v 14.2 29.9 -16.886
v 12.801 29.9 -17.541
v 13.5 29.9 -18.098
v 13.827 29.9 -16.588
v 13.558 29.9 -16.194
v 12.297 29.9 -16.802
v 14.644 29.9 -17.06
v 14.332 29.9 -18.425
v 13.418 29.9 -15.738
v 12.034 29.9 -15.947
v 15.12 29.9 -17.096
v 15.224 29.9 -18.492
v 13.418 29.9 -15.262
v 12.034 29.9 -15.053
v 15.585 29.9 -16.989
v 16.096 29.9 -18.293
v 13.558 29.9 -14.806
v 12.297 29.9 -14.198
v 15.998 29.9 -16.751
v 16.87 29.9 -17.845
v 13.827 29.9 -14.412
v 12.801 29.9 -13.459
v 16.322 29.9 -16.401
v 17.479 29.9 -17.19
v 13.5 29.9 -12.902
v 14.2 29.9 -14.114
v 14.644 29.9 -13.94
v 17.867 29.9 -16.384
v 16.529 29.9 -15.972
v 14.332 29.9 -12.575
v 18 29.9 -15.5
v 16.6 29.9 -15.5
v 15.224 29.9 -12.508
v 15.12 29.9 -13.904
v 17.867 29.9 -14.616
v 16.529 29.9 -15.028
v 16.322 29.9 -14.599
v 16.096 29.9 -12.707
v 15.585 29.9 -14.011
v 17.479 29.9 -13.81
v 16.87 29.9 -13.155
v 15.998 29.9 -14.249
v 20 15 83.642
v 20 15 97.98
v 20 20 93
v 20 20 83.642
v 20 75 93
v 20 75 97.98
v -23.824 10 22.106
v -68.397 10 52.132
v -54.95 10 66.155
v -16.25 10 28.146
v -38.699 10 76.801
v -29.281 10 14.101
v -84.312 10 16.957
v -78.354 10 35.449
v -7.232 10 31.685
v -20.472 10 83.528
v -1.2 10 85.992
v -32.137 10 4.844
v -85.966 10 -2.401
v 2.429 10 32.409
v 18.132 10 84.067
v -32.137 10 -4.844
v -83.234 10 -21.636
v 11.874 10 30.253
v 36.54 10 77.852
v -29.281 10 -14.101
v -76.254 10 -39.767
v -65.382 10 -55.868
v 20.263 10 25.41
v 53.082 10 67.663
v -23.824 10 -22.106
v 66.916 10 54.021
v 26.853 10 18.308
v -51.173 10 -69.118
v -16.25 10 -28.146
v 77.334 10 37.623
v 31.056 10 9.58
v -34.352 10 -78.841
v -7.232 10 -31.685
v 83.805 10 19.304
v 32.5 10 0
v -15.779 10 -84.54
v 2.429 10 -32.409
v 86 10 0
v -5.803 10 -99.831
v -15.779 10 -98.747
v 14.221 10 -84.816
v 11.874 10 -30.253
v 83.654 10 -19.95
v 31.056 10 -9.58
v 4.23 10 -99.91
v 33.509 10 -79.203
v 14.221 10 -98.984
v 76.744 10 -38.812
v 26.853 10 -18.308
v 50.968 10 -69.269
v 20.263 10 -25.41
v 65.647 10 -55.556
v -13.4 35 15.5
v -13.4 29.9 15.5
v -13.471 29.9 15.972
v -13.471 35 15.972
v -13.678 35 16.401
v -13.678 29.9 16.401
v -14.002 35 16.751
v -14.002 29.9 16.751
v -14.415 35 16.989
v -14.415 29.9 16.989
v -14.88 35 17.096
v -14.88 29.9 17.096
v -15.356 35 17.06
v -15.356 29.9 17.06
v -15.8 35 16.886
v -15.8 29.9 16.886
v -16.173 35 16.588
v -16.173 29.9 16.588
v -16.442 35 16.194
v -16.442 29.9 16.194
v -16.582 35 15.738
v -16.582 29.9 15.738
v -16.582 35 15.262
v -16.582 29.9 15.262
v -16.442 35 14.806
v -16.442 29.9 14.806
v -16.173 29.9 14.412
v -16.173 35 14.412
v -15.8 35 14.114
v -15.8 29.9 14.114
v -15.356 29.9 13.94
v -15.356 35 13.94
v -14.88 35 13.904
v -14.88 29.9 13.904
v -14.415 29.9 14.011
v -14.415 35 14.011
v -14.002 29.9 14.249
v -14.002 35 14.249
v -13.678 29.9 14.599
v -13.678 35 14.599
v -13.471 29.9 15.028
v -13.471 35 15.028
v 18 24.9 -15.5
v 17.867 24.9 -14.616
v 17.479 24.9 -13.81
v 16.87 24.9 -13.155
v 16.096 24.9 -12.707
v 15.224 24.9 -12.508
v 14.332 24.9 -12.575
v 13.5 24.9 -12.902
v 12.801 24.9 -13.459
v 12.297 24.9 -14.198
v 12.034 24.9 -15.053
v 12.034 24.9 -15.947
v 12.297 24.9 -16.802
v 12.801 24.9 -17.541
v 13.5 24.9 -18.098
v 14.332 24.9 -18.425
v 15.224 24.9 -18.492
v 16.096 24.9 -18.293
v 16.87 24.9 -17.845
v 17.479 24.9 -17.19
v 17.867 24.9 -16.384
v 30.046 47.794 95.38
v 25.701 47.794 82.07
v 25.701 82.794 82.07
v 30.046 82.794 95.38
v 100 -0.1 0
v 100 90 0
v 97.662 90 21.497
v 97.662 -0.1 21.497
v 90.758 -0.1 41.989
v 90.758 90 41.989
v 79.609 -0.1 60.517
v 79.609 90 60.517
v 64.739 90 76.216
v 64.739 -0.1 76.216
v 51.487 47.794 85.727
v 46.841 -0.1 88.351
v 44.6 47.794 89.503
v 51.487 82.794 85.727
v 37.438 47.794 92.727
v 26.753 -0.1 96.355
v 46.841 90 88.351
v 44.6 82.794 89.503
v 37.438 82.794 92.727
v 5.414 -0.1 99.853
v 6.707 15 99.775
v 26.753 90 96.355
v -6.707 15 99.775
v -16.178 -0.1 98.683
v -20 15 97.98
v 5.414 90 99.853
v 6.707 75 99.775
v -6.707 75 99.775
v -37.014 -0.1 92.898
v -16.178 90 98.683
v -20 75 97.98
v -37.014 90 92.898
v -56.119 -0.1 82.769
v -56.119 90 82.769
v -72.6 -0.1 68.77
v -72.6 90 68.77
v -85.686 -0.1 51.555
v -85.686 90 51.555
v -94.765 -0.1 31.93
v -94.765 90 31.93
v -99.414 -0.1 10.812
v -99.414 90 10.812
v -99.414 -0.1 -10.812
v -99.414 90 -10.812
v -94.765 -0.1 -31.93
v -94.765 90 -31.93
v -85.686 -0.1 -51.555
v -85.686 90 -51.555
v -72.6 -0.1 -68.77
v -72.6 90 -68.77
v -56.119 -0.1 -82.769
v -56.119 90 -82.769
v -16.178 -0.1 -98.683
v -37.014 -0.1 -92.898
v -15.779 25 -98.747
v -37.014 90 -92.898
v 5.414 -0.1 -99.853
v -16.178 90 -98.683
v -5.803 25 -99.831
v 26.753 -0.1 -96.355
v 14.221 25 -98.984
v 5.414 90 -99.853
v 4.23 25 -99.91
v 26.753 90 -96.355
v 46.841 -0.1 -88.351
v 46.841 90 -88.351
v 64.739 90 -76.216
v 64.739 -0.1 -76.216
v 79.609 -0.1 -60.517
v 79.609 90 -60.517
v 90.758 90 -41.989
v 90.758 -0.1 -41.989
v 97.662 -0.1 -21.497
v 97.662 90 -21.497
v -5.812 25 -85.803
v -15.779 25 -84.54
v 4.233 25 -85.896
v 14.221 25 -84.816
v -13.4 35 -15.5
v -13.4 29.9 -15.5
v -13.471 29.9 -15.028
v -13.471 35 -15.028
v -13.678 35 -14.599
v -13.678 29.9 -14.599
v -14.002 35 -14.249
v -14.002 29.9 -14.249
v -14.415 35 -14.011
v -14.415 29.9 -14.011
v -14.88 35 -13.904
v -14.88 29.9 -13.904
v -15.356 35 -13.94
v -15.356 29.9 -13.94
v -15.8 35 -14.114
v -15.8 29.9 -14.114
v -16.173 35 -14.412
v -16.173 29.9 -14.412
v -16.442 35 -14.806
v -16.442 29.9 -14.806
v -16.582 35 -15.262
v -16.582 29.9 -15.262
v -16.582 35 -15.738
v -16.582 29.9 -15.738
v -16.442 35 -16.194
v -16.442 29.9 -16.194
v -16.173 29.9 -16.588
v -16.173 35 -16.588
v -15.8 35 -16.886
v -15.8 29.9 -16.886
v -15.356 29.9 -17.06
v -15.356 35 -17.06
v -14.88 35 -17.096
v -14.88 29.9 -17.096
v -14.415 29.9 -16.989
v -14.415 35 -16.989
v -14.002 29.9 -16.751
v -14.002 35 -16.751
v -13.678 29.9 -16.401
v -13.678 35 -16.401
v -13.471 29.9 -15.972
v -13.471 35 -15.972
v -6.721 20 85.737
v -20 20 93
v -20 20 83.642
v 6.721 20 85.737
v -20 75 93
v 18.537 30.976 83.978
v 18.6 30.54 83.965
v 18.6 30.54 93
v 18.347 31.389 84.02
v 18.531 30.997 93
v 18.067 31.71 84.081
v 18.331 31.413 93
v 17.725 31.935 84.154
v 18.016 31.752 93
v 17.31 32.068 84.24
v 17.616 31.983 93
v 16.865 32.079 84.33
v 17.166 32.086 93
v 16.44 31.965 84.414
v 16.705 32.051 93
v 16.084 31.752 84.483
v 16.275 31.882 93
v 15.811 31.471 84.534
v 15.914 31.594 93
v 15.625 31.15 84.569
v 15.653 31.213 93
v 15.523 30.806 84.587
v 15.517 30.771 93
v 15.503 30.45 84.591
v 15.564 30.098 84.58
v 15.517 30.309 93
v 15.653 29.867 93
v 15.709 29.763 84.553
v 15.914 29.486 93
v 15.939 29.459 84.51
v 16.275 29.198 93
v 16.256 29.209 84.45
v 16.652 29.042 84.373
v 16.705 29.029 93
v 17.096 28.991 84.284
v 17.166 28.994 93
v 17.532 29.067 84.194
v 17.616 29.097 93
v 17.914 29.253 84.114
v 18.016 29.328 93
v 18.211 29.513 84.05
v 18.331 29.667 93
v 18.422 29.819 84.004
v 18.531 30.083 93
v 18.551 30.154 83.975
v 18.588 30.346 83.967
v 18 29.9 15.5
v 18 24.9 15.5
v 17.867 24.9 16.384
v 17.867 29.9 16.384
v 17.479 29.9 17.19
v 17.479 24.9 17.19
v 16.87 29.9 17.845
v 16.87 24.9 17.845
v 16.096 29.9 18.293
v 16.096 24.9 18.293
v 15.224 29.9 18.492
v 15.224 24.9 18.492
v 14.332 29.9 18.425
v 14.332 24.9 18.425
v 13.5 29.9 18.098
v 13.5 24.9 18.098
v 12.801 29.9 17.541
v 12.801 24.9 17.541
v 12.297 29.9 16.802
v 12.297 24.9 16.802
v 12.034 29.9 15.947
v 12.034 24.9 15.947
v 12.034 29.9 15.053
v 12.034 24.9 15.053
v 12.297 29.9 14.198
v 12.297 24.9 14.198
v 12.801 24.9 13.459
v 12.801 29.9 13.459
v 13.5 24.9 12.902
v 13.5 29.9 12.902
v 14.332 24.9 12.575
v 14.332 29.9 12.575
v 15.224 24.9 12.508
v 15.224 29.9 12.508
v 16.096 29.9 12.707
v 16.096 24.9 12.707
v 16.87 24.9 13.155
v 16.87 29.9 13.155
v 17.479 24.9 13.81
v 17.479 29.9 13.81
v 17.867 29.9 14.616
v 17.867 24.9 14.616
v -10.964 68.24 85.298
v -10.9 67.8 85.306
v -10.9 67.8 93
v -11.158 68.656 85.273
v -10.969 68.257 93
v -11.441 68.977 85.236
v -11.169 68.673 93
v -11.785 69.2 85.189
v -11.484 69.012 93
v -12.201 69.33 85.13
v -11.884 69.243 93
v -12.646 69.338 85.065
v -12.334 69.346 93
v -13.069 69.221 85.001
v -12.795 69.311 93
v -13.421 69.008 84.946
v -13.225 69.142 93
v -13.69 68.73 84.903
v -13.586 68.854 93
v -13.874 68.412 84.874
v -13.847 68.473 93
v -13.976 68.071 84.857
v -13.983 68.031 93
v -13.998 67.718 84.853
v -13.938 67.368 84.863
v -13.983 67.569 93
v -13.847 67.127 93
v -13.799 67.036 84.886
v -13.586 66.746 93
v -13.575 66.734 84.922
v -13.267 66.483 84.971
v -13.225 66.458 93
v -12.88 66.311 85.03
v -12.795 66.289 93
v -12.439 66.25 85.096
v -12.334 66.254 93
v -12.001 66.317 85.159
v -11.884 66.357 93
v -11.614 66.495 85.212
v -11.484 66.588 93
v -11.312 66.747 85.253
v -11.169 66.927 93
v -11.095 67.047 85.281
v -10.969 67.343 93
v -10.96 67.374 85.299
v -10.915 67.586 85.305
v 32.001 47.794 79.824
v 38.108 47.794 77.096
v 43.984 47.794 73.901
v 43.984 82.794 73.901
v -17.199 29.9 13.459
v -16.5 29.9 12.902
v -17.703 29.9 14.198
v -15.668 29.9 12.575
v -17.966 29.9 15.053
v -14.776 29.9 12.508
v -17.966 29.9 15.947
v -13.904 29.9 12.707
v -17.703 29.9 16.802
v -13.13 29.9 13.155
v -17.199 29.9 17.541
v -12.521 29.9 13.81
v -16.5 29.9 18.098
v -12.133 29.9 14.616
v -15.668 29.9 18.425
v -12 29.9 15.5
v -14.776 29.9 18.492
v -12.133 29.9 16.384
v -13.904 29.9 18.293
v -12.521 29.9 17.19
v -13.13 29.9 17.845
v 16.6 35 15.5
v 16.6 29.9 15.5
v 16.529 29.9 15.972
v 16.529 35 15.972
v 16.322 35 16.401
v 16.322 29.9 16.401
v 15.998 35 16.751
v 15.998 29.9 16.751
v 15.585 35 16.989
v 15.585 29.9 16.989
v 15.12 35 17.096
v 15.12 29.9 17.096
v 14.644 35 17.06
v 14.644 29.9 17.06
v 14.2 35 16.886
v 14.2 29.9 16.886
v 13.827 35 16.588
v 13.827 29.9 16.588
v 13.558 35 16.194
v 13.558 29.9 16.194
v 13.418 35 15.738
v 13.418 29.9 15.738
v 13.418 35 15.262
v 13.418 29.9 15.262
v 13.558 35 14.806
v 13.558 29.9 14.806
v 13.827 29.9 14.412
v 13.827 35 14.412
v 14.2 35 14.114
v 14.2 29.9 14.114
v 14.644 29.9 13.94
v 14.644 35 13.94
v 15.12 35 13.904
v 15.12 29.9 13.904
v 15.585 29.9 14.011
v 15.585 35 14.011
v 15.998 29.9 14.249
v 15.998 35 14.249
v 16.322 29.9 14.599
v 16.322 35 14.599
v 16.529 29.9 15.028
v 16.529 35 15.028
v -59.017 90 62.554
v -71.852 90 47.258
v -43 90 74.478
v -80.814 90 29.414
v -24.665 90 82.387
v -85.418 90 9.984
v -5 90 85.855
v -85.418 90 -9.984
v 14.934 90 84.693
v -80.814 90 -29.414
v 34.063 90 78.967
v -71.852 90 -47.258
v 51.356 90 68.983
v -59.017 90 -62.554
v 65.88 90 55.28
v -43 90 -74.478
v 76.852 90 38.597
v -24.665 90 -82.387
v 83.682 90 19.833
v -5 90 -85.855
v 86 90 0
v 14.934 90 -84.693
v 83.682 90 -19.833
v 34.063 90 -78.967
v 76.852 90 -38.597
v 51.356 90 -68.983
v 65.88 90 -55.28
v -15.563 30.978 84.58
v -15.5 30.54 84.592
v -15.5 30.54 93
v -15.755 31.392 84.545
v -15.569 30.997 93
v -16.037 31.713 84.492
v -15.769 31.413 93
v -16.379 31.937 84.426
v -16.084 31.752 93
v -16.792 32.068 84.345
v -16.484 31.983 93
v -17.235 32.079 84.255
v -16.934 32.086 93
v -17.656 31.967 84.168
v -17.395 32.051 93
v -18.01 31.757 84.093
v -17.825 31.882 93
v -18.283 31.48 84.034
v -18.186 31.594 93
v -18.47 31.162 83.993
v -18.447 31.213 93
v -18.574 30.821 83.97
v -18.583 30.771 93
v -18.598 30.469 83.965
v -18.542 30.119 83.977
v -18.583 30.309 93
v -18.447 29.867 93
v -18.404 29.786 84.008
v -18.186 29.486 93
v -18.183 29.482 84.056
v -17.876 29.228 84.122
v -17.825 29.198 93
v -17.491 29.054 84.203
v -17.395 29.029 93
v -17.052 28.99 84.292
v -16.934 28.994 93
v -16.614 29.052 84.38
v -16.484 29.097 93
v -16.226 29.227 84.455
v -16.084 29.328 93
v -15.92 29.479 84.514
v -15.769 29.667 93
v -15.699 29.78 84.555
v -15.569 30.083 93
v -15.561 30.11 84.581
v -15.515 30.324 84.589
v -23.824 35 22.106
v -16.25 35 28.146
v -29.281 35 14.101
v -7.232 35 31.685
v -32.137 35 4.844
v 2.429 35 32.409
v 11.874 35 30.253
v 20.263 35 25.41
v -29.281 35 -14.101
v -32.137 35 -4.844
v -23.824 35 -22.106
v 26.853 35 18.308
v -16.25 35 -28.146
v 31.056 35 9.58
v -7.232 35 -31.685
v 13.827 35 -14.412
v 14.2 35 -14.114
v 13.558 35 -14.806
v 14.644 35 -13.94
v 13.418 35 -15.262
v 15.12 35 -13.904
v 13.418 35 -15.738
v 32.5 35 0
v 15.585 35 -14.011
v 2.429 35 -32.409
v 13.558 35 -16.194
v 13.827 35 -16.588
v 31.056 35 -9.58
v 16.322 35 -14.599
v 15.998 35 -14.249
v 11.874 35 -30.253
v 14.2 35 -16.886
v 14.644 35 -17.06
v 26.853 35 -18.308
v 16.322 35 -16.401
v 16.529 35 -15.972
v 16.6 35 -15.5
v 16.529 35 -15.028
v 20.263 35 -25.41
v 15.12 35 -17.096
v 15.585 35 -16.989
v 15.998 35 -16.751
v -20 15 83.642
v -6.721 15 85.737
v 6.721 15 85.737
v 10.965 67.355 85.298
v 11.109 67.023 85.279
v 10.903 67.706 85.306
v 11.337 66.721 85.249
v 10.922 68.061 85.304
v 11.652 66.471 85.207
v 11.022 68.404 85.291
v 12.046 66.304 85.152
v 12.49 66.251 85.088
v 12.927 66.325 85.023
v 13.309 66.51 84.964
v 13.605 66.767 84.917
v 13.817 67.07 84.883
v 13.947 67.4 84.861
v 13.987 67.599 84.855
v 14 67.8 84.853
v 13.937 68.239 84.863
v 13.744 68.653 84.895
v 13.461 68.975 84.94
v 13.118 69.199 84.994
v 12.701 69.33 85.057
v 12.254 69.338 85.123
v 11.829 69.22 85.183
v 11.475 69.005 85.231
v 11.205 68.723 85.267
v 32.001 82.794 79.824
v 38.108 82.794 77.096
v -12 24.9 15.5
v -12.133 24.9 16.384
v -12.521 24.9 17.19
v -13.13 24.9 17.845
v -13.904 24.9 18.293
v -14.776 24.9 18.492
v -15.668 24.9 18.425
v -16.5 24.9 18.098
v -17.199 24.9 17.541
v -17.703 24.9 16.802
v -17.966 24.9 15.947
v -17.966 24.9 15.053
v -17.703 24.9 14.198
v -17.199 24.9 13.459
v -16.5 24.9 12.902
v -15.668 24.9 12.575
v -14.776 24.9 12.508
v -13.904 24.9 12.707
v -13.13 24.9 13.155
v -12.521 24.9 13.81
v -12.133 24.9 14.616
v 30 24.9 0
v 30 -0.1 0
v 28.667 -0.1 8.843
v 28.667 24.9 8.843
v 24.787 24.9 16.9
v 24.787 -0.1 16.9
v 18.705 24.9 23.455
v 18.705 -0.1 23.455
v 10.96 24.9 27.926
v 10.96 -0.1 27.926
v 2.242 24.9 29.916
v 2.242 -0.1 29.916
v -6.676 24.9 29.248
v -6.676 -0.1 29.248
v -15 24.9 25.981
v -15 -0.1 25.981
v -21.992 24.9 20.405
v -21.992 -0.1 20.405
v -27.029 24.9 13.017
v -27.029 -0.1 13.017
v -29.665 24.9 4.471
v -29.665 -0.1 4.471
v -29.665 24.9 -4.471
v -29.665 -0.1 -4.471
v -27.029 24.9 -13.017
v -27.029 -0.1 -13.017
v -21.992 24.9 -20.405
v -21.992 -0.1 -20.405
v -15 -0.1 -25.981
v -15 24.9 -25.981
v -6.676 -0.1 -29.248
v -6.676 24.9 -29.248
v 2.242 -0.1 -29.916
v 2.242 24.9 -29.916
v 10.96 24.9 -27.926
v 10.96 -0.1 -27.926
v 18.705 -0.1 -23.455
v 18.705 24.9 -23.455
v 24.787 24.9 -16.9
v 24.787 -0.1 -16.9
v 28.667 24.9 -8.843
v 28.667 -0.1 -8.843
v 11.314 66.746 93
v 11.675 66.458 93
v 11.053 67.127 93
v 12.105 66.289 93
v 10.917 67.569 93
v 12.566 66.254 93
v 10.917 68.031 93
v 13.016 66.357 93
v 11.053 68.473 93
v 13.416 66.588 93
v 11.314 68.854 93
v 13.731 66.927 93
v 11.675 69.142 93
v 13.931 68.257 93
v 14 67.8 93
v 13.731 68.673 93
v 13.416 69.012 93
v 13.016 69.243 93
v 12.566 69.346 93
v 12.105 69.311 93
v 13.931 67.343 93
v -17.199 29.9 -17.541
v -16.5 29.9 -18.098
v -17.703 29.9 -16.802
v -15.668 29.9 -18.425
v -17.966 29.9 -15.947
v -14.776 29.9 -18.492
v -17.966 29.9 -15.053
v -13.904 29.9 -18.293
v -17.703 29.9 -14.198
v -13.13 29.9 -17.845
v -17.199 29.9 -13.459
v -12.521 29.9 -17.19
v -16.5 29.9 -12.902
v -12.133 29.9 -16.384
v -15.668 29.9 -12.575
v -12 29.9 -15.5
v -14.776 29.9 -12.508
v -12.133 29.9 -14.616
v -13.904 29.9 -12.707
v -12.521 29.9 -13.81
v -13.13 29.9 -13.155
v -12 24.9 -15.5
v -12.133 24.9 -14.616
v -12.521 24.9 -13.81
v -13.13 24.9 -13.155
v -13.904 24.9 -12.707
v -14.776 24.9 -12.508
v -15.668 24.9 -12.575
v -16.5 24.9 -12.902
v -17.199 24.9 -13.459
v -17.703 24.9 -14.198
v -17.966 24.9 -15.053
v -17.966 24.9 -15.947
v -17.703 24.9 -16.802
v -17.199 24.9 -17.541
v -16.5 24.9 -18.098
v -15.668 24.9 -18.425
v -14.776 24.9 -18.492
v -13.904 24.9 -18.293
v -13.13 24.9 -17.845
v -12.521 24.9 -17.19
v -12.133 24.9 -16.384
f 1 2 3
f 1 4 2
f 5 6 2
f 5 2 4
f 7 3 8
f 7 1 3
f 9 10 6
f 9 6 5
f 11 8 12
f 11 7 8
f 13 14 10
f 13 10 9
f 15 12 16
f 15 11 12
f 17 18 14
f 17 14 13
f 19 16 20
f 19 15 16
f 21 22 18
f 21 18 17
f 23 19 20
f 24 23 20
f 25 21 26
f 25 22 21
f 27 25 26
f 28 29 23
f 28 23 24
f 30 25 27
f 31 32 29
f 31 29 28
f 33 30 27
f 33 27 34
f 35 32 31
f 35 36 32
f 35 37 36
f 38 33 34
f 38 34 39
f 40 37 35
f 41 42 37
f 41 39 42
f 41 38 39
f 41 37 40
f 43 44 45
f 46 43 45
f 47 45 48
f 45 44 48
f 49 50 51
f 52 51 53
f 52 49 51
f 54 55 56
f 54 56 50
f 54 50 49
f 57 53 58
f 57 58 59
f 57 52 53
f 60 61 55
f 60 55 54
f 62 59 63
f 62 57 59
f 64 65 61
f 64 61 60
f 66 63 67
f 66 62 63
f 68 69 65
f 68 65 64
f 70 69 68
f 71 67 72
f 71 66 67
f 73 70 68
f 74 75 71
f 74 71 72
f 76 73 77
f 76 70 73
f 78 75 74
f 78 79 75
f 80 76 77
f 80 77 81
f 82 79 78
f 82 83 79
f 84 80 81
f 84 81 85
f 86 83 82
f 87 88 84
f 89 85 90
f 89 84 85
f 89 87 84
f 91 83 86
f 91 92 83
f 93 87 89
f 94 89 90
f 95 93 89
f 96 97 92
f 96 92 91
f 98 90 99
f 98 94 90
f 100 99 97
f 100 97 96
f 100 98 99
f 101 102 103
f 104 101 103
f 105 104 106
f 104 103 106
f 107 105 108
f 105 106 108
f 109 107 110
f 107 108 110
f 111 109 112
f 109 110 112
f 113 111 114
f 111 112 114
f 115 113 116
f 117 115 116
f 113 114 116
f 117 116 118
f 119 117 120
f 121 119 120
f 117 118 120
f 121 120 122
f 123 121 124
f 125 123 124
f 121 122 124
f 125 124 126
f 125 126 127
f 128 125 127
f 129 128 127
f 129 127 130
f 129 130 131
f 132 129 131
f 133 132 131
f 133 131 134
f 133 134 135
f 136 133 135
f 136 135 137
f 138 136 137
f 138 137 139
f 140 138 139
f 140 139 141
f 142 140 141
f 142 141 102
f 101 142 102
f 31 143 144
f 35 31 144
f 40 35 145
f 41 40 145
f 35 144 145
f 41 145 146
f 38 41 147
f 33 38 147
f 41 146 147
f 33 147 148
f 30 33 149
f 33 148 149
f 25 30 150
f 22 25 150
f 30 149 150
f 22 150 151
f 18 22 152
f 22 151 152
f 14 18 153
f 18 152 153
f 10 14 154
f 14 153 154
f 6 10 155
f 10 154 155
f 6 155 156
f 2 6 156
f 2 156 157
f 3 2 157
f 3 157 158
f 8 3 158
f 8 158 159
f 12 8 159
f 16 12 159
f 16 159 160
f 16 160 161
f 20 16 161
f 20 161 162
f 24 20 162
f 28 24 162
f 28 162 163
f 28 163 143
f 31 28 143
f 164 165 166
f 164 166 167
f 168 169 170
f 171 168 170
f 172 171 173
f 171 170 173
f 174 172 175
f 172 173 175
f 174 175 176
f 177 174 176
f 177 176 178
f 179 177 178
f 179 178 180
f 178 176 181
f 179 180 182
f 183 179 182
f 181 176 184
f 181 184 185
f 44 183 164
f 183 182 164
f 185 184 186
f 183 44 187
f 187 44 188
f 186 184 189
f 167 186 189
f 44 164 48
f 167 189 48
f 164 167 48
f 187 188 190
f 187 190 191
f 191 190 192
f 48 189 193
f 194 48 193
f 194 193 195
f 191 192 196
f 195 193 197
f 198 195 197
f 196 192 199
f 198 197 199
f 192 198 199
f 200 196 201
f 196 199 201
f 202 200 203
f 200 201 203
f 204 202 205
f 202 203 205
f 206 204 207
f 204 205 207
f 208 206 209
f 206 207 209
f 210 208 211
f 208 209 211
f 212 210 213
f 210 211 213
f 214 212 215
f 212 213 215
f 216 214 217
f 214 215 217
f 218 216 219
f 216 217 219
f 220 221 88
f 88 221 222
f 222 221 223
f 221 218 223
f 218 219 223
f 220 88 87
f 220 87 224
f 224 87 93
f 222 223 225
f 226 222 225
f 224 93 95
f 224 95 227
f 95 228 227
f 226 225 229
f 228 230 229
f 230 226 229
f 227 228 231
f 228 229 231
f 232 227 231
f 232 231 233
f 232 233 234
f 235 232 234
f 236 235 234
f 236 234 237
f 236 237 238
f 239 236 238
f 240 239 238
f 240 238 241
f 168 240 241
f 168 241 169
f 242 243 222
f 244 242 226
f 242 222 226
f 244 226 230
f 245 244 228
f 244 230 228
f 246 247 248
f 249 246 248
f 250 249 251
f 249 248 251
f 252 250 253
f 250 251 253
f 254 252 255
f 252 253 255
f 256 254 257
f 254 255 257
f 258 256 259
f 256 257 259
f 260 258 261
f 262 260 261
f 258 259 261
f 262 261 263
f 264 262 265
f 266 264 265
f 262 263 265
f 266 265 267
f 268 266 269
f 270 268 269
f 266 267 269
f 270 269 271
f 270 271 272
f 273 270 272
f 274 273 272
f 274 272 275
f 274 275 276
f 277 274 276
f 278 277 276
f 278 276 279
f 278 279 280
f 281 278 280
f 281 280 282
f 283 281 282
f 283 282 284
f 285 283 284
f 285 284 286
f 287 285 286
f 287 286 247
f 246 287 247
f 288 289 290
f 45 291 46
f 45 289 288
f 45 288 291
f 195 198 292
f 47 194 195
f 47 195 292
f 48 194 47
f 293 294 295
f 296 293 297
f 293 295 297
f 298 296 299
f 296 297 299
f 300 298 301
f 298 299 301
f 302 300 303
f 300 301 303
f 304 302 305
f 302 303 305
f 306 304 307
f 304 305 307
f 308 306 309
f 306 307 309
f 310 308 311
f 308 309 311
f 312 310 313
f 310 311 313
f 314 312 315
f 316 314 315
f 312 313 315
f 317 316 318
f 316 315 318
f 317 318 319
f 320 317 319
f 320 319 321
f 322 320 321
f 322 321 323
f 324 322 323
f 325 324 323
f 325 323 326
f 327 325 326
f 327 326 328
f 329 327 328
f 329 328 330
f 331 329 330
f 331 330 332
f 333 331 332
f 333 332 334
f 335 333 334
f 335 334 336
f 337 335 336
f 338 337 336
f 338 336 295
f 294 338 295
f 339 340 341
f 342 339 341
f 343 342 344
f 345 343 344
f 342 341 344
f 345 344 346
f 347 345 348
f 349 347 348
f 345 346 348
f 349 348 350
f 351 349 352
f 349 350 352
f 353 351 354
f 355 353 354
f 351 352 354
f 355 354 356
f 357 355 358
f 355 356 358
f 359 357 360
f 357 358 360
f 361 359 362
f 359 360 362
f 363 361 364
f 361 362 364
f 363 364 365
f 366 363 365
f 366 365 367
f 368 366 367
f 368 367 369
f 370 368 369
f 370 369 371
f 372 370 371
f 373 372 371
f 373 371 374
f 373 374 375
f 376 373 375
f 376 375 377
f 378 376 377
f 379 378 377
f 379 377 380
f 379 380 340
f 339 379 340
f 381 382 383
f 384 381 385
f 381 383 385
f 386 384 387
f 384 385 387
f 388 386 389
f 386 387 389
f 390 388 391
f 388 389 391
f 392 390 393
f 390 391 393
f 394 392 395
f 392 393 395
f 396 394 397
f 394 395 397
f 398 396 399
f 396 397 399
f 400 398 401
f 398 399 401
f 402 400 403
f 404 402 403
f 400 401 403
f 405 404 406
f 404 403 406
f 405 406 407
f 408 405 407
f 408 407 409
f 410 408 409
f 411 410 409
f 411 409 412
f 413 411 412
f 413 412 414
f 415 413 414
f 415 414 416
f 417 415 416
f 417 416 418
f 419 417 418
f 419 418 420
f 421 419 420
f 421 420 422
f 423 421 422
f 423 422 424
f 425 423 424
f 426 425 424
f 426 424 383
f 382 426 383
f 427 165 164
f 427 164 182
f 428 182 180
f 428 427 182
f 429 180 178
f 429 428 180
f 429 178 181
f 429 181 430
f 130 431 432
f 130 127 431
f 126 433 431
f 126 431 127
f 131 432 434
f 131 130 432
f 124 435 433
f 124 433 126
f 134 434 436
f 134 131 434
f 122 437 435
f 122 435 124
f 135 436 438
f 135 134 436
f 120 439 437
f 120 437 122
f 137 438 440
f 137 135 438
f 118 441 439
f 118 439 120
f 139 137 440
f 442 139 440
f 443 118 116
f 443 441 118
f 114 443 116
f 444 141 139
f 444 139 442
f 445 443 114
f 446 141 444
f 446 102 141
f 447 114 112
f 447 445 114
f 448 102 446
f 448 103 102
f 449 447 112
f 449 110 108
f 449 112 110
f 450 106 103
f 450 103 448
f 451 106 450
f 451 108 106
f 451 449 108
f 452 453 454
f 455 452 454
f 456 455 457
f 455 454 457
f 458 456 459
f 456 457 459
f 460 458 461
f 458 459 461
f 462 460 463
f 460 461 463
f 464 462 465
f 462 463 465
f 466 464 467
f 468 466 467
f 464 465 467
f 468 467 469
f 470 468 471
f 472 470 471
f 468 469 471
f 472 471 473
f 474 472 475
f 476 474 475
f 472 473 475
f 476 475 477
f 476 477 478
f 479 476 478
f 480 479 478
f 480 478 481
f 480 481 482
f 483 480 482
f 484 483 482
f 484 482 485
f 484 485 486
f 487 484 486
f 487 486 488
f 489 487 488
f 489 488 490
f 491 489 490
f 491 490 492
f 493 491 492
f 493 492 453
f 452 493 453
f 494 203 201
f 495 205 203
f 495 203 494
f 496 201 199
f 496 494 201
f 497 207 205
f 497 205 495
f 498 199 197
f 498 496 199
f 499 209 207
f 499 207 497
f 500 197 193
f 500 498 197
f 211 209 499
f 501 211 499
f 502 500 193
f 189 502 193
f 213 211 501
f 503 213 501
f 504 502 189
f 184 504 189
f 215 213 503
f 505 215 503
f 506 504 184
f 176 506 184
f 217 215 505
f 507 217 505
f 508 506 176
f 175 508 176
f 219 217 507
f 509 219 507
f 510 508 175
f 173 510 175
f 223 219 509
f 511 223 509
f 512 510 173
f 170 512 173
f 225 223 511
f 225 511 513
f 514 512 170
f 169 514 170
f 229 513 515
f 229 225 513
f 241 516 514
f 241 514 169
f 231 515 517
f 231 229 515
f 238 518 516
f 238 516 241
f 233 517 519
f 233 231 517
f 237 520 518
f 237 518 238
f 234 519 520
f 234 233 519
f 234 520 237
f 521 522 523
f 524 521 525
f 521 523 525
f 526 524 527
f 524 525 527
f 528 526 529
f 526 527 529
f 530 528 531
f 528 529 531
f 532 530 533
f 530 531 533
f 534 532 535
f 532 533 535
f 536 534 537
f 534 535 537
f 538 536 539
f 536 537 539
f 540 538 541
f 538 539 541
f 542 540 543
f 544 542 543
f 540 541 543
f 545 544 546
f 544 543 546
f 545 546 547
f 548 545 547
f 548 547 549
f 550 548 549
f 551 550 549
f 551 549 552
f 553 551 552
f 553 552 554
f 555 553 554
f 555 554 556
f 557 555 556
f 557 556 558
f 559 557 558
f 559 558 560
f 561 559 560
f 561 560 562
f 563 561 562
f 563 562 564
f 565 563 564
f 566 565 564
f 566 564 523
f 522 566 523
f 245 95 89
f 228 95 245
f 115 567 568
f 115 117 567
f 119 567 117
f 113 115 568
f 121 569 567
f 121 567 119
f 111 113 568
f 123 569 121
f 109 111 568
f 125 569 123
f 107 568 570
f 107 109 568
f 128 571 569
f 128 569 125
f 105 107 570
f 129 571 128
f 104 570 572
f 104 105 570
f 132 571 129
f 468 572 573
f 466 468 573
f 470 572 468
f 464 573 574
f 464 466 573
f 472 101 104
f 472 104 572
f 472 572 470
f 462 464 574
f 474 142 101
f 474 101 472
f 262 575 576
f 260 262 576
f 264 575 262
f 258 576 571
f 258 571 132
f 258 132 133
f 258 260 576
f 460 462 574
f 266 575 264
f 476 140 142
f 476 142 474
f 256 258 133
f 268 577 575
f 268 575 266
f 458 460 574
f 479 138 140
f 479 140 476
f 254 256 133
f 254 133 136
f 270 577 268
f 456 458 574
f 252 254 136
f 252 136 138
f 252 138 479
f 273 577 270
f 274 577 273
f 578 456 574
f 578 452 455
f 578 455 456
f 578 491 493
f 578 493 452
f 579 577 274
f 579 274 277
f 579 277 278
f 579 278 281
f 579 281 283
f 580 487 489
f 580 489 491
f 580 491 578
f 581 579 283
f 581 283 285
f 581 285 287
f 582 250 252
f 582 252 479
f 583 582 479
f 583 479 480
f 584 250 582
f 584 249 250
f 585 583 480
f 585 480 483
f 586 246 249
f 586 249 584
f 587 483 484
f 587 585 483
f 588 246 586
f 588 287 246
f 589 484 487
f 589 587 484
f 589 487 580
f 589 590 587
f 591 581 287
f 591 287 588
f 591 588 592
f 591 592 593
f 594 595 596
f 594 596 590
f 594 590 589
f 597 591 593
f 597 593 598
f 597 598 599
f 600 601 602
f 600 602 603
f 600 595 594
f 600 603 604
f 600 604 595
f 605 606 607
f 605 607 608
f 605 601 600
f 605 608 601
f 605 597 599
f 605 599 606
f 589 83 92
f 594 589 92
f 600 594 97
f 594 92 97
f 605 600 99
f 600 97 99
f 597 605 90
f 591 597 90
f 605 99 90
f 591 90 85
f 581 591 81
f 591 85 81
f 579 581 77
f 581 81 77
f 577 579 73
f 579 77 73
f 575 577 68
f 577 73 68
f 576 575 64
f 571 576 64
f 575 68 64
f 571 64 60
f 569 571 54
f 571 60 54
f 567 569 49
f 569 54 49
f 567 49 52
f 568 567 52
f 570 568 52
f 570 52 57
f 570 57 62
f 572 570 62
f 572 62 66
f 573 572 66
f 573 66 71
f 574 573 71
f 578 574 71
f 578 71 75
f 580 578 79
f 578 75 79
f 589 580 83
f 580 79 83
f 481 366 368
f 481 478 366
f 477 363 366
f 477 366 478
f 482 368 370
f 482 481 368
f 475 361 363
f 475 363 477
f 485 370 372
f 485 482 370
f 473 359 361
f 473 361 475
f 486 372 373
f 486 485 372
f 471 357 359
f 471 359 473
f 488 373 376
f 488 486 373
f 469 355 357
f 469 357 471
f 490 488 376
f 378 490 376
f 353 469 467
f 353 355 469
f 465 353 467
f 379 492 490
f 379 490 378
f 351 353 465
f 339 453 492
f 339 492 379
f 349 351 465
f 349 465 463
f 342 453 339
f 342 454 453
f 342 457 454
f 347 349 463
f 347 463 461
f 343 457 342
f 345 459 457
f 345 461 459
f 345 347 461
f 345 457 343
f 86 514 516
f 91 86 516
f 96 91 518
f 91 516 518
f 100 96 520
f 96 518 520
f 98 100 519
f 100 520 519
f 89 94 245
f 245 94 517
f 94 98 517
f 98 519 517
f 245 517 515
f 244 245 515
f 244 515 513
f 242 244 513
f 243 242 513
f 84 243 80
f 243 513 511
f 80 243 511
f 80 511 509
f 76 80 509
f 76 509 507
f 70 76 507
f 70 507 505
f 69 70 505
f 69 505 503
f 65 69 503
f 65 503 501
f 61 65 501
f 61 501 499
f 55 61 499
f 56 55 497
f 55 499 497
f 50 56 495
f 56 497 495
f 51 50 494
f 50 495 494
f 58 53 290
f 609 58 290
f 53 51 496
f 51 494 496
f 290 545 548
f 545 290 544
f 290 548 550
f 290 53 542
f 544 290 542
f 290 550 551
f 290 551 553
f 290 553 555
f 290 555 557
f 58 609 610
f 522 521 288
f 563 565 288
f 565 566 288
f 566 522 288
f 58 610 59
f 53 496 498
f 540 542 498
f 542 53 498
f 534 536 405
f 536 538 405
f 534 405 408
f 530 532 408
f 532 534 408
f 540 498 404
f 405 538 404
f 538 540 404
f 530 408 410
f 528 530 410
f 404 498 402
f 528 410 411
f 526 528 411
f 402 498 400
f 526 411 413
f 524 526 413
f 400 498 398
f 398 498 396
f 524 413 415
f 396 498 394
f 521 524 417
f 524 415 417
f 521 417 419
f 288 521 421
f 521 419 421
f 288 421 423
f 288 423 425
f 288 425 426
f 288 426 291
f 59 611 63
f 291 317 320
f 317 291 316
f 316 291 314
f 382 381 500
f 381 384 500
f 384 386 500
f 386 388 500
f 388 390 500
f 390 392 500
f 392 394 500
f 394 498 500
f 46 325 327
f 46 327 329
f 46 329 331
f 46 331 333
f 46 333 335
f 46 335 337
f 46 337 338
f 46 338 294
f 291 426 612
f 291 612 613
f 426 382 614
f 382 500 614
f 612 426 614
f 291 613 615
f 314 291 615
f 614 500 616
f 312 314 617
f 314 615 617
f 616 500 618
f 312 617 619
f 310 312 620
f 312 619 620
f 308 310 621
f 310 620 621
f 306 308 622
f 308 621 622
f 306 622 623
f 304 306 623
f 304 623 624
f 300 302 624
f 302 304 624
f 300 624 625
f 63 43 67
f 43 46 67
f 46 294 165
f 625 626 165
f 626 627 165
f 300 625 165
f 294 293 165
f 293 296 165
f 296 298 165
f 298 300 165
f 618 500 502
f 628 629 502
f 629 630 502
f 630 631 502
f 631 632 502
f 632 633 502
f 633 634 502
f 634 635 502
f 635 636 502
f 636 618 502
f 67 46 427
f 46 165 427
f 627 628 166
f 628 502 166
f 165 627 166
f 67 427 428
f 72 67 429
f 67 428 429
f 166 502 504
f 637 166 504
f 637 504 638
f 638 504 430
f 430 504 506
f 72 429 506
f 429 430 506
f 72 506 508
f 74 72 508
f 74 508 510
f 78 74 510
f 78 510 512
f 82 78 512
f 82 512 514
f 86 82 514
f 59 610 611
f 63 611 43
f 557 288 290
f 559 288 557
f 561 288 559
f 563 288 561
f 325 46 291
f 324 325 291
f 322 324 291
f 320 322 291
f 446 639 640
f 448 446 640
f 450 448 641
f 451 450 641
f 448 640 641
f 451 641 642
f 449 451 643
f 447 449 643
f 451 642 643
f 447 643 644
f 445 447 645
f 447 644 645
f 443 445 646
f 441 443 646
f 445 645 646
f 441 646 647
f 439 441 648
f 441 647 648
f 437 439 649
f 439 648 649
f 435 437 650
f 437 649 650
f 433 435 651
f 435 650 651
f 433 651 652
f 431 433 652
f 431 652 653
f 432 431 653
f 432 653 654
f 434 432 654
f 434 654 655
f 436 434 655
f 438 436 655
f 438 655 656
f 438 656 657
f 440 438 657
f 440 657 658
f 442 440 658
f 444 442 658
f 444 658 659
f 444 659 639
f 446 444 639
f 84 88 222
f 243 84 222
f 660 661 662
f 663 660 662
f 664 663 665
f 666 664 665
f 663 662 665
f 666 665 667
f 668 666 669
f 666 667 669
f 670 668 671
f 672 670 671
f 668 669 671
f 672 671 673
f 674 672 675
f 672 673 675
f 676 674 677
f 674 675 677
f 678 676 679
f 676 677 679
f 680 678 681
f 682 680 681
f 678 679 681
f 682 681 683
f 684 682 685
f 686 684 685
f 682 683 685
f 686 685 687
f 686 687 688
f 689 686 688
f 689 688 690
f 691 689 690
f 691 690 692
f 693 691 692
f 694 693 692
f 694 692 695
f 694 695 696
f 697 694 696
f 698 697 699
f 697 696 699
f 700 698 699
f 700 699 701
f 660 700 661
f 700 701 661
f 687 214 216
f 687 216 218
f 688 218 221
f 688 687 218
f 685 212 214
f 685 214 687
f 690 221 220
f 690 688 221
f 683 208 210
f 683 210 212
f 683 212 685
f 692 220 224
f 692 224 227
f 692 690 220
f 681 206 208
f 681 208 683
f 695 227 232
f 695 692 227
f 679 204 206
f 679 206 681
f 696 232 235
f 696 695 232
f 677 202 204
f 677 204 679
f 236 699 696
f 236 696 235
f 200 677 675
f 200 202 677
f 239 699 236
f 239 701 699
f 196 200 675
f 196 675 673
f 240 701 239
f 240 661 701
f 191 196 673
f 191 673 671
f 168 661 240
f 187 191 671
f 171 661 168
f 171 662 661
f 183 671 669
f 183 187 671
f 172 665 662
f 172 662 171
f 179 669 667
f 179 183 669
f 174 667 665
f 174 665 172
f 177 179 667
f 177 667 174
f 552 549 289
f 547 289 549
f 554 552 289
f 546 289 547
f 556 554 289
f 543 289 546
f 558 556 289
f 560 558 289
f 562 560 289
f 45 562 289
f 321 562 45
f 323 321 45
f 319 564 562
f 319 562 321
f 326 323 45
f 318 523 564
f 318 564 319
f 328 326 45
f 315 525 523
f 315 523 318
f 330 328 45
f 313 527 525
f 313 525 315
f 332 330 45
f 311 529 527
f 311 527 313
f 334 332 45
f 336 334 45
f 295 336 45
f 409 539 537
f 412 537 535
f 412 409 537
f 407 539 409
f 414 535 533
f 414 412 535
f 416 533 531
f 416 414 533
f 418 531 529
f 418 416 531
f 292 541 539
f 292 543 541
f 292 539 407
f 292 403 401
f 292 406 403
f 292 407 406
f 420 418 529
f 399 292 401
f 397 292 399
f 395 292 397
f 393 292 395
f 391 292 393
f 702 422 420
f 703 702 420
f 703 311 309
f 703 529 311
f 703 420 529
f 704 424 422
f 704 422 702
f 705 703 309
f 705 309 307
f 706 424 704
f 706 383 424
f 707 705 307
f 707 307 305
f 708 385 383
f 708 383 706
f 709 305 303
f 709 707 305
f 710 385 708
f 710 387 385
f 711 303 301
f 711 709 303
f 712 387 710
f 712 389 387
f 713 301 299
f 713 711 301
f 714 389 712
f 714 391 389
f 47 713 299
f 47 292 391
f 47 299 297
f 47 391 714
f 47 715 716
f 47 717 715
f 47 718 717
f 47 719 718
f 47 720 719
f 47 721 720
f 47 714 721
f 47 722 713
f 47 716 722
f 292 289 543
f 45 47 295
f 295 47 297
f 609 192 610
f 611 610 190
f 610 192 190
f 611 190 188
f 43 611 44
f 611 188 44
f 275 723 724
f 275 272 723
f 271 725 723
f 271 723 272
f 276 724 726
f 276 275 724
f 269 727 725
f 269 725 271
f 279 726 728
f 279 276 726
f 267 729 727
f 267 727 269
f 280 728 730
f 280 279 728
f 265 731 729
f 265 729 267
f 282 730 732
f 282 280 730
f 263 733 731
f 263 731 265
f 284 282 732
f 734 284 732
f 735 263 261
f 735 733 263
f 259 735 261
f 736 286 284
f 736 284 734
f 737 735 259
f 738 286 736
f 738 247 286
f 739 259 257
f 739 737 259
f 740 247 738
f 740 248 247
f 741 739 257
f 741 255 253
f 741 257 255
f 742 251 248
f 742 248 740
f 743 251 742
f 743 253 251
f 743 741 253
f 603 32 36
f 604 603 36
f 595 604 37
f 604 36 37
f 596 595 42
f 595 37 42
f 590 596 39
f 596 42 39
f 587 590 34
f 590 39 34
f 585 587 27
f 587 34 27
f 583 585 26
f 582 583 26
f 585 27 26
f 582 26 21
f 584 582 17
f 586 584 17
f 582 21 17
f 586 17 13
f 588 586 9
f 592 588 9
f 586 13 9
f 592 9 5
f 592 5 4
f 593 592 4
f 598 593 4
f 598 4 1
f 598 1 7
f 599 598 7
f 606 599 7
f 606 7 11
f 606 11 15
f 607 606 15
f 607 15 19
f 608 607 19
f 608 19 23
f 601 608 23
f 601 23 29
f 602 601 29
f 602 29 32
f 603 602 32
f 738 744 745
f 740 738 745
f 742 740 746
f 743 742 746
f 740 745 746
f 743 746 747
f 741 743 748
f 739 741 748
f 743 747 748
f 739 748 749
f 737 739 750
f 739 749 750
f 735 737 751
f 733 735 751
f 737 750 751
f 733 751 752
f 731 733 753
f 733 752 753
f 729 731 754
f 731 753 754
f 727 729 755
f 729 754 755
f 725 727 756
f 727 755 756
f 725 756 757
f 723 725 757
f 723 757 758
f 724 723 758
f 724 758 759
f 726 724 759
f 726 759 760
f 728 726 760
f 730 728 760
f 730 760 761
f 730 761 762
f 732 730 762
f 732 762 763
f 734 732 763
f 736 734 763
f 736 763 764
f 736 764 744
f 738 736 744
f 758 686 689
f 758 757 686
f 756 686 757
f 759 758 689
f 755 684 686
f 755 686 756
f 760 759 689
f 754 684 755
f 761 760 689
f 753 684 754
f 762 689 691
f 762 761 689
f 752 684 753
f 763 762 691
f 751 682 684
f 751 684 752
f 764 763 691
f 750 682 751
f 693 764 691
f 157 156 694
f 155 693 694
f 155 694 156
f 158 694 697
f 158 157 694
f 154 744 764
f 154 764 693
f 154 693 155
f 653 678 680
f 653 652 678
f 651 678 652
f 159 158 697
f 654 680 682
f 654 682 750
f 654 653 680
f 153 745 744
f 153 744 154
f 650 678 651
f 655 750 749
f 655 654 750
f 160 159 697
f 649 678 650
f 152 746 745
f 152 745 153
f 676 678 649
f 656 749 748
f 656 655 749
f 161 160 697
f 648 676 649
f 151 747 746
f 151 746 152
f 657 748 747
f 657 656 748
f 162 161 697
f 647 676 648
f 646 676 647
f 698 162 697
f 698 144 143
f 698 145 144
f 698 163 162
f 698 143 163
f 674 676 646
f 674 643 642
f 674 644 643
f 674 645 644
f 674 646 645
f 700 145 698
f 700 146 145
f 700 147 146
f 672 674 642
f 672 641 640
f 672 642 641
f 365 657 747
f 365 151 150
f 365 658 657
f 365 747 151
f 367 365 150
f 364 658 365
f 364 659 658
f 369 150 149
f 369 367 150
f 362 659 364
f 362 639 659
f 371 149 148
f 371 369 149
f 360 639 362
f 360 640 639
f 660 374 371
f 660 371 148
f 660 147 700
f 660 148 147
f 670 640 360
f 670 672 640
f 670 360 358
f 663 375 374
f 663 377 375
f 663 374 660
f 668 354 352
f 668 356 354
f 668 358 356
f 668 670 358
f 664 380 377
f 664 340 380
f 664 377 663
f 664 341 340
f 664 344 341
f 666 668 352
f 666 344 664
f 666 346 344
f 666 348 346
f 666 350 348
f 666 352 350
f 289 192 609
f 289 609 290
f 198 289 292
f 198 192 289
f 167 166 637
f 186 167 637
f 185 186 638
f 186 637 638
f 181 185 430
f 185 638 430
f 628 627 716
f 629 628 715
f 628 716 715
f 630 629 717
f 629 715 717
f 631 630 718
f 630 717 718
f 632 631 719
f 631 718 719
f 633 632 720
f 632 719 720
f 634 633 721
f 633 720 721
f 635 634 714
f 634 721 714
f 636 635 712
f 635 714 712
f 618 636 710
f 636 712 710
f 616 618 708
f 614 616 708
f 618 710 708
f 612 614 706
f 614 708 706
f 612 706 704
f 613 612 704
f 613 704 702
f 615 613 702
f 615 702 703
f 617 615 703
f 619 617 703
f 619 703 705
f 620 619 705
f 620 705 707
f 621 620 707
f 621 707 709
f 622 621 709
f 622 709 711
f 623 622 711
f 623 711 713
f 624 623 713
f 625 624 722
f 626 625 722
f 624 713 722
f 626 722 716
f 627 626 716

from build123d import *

# Parameters (mm, degrees)
SKETCH1_R               = 100
BOSS_EXTRUDE3_DEPTH     = 90
SKETCH4_W               = 40
SKETCH4_H               = 60
CUT_EXTRUDE2_DEPTH      = 26
CUT_EXTRUDE2_DEPTH_BACK = 12
SKETCH12_R              = 100
BOSS_EXTRUDE4_DEPTH     = 0.1
SKETCH13_R              = 86
CUT_EXTRUDE8_DEPTH      = 80
SKETCH18_R              = 32.5
BOSS_EXTRUDE5_DEPTH     = 25
SKETCH16_R              = 1.6
CUT_EXTRUDE11_DEPTH     = 91.1
SKETCH17_R              = 3
CUT_EXTRUDE12_DEPTH     = 30
SKETCH19_R              = 30
CUT_EXTRUDE13_DEPTH     = 25
SKETCH20_W              = 40
SKETCH20_H              = 5
CUT_EXTRUDE14_DEPTH     = 25
SKETCH21_R              = 1.55
CUT_EXTRUDE15_DEPTH     = 25
CUT_EXTRUDE16_DEPTH     = 35
SKETCH23_W              = 30
SKETCH23_H              = 15
CUT_EXTRUDE17_DEPTH     = 20


with BuildPart() as part:
    # Sketch1 → Boss-Extrude3 (new body)
    with BuildSketch(Plane(origin=(0, 0, 0), x_dir=(1, 0, 0), z_dir=(0, 1, 0))):
        Circle(SKETCH1_R)
    extrude(amount=BOSS_EXTRUDE3_DEPTH)

    # Sketch4 → Cut-Extrude2 (cut, two sides)
    with BuildSketch(Plane.XY.offset(105)) as cut_extrude2_sk:
        with Locations((0, 45)):
            Rectangle(SKETCH4_W, SKETCH4_H)
    extrude(amount=CUT_EXTRUDE2_DEPTH, mode=Mode.SUBTRACT)
    extrude(cut_extrude2_sk.sketch, amount=-CUT_EXTRUDE2_DEPTH_BACK, mode=Mode.SUBTRACT)

    # Sketch12 → Boss-Extrude4 (add)
    with BuildSketch(Plane.XZ):
        Circle(SKETCH12_R)
    extrude(amount=BOSS_EXTRUDE4_DEPTH)

    # Sketch13 → Cut-Extrude8 (cut)
    with BuildSketch(Plane(origin=(0, 90, 0), x_dir=(1, 0, 0), z_dir=(0, 1, 0))):
        Circle(SKETCH13_R)
    extrude(amount=-CUT_EXTRUDE8_DEPTH, mode=Mode.SUBTRACT)

    # Sketch18 → Boss-Extrude5 (add)
    with BuildSketch(Plane(origin=(0, 10, 0), x_dir=(1, 0, 0), z_dir=(0, 1, 0))):
        Circle(SKETCH18_R)
    extrude(amount=BOSS_EXTRUDE5_DEPTH)

    # Sketch16 → Cut-Extrude11 (cut, through all)
    with BuildSketch(Plane.XZ.offset(0.1)):
        with Locations((-15, 15.5)):
            Circle(SKETCH16_R)
        with Locations((15, 15.5)):
            Circle(SKETCH16_R)
        with Locations((15, -15.5)):
            Circle(SKETCH16_R)
        with Locations((-15, -15.5)):
            Circle(SKETCH16_R)
    extrude(amount=-CUT_EXTRUDE11_DEPTH, mode=Mode.SUBTRACT)

    # Sketch17 → Cut-Extrude12 (cut)
    with BuildSketch(Plane.XZ.offset(0.1)):
        with Locations((-15, 15.5)):
            Circle(SKETCH17_R)
        with Locations((15, 15.5)):
            Circle(SKETCH17_R)
        with Locations((-15, -15.5)):
            Circle(SKETCH17_R)
        with Locations((15, -15.5)):
            Circle(SKETCH17_R)
    extrude(amount=-CUT_EXTRUDE12_DEPTH, mode=Mode.SUBTRACT)

    # Sketch19 → Cut-Extrude13 (cut)
    with BuildSketch(Plane.XZ.offset(0.1)):
        Circle(SKETCH19_R)
    extrude(amount=-CUT_EXTRUDE13_DEPTH, mode=Mode.SUBTRACT)

    # Sketch20 → Cut-Extrude14 (cut)
    with BuildSketch(Plane.XY.offset(93)):
        with Locations((0, 17.5)):
            Rectangle(SKETCH20_W, SKETCH20_H)
    extrude(amount=-CUT_EXTRUDE14_DEPTH, mode=Mode.SUBTRACT)

    # Sketch21 → Cut-Extrude15 (cut)
    with BuildSketch(Plane.XY.offset(93)):
        with Locations((12.45, 67.8)):
            Circle(SKETCH21_R)
        with Locations((-12.45, 67.8)):
            Circle(SKETCH21_R)
        with Locations((-17.05, 30.54)):
            Circle(SKETCH21_R)
        with Locations((17.05, 30.54)):
            Circle(SKETCH21_R)
    extrude(amount=-CUT_EXTRUDE15_DEPTH, mode=Mode.SUBTRACT)

    # Sketch22 → Cut-Extrude16 (cut)
    with BuildSketch(Plane(origin=(22.204096953, 47.794122581, -296.404157649), x_dir=(1, 0, 0), z_dir=(0, 1, 0))):
        Polygon((-6.791929493, -346.959107226), (12.404969277, -405.762485644), (37.058002756, -394.3841625), (3.953655983, -342.212063172), align=None)
    extrude(amount=CUT_EXTRUDE16_DEPTH, mode=Mode.SUBTRACT)

    # Sketch23 → Cut-Extrude17 (cut)
    with BuildSketch(Plane.XY.offset(-100)):
        with Locations((-0.77861777, 17.5)):
            Rectangle(SKETCH23_W, SKETCH23_H)
    extrude(amount=CUT_EXTRUDE17_DEPTH, mode=Mode.SUBTRACT)


solid = part.part
